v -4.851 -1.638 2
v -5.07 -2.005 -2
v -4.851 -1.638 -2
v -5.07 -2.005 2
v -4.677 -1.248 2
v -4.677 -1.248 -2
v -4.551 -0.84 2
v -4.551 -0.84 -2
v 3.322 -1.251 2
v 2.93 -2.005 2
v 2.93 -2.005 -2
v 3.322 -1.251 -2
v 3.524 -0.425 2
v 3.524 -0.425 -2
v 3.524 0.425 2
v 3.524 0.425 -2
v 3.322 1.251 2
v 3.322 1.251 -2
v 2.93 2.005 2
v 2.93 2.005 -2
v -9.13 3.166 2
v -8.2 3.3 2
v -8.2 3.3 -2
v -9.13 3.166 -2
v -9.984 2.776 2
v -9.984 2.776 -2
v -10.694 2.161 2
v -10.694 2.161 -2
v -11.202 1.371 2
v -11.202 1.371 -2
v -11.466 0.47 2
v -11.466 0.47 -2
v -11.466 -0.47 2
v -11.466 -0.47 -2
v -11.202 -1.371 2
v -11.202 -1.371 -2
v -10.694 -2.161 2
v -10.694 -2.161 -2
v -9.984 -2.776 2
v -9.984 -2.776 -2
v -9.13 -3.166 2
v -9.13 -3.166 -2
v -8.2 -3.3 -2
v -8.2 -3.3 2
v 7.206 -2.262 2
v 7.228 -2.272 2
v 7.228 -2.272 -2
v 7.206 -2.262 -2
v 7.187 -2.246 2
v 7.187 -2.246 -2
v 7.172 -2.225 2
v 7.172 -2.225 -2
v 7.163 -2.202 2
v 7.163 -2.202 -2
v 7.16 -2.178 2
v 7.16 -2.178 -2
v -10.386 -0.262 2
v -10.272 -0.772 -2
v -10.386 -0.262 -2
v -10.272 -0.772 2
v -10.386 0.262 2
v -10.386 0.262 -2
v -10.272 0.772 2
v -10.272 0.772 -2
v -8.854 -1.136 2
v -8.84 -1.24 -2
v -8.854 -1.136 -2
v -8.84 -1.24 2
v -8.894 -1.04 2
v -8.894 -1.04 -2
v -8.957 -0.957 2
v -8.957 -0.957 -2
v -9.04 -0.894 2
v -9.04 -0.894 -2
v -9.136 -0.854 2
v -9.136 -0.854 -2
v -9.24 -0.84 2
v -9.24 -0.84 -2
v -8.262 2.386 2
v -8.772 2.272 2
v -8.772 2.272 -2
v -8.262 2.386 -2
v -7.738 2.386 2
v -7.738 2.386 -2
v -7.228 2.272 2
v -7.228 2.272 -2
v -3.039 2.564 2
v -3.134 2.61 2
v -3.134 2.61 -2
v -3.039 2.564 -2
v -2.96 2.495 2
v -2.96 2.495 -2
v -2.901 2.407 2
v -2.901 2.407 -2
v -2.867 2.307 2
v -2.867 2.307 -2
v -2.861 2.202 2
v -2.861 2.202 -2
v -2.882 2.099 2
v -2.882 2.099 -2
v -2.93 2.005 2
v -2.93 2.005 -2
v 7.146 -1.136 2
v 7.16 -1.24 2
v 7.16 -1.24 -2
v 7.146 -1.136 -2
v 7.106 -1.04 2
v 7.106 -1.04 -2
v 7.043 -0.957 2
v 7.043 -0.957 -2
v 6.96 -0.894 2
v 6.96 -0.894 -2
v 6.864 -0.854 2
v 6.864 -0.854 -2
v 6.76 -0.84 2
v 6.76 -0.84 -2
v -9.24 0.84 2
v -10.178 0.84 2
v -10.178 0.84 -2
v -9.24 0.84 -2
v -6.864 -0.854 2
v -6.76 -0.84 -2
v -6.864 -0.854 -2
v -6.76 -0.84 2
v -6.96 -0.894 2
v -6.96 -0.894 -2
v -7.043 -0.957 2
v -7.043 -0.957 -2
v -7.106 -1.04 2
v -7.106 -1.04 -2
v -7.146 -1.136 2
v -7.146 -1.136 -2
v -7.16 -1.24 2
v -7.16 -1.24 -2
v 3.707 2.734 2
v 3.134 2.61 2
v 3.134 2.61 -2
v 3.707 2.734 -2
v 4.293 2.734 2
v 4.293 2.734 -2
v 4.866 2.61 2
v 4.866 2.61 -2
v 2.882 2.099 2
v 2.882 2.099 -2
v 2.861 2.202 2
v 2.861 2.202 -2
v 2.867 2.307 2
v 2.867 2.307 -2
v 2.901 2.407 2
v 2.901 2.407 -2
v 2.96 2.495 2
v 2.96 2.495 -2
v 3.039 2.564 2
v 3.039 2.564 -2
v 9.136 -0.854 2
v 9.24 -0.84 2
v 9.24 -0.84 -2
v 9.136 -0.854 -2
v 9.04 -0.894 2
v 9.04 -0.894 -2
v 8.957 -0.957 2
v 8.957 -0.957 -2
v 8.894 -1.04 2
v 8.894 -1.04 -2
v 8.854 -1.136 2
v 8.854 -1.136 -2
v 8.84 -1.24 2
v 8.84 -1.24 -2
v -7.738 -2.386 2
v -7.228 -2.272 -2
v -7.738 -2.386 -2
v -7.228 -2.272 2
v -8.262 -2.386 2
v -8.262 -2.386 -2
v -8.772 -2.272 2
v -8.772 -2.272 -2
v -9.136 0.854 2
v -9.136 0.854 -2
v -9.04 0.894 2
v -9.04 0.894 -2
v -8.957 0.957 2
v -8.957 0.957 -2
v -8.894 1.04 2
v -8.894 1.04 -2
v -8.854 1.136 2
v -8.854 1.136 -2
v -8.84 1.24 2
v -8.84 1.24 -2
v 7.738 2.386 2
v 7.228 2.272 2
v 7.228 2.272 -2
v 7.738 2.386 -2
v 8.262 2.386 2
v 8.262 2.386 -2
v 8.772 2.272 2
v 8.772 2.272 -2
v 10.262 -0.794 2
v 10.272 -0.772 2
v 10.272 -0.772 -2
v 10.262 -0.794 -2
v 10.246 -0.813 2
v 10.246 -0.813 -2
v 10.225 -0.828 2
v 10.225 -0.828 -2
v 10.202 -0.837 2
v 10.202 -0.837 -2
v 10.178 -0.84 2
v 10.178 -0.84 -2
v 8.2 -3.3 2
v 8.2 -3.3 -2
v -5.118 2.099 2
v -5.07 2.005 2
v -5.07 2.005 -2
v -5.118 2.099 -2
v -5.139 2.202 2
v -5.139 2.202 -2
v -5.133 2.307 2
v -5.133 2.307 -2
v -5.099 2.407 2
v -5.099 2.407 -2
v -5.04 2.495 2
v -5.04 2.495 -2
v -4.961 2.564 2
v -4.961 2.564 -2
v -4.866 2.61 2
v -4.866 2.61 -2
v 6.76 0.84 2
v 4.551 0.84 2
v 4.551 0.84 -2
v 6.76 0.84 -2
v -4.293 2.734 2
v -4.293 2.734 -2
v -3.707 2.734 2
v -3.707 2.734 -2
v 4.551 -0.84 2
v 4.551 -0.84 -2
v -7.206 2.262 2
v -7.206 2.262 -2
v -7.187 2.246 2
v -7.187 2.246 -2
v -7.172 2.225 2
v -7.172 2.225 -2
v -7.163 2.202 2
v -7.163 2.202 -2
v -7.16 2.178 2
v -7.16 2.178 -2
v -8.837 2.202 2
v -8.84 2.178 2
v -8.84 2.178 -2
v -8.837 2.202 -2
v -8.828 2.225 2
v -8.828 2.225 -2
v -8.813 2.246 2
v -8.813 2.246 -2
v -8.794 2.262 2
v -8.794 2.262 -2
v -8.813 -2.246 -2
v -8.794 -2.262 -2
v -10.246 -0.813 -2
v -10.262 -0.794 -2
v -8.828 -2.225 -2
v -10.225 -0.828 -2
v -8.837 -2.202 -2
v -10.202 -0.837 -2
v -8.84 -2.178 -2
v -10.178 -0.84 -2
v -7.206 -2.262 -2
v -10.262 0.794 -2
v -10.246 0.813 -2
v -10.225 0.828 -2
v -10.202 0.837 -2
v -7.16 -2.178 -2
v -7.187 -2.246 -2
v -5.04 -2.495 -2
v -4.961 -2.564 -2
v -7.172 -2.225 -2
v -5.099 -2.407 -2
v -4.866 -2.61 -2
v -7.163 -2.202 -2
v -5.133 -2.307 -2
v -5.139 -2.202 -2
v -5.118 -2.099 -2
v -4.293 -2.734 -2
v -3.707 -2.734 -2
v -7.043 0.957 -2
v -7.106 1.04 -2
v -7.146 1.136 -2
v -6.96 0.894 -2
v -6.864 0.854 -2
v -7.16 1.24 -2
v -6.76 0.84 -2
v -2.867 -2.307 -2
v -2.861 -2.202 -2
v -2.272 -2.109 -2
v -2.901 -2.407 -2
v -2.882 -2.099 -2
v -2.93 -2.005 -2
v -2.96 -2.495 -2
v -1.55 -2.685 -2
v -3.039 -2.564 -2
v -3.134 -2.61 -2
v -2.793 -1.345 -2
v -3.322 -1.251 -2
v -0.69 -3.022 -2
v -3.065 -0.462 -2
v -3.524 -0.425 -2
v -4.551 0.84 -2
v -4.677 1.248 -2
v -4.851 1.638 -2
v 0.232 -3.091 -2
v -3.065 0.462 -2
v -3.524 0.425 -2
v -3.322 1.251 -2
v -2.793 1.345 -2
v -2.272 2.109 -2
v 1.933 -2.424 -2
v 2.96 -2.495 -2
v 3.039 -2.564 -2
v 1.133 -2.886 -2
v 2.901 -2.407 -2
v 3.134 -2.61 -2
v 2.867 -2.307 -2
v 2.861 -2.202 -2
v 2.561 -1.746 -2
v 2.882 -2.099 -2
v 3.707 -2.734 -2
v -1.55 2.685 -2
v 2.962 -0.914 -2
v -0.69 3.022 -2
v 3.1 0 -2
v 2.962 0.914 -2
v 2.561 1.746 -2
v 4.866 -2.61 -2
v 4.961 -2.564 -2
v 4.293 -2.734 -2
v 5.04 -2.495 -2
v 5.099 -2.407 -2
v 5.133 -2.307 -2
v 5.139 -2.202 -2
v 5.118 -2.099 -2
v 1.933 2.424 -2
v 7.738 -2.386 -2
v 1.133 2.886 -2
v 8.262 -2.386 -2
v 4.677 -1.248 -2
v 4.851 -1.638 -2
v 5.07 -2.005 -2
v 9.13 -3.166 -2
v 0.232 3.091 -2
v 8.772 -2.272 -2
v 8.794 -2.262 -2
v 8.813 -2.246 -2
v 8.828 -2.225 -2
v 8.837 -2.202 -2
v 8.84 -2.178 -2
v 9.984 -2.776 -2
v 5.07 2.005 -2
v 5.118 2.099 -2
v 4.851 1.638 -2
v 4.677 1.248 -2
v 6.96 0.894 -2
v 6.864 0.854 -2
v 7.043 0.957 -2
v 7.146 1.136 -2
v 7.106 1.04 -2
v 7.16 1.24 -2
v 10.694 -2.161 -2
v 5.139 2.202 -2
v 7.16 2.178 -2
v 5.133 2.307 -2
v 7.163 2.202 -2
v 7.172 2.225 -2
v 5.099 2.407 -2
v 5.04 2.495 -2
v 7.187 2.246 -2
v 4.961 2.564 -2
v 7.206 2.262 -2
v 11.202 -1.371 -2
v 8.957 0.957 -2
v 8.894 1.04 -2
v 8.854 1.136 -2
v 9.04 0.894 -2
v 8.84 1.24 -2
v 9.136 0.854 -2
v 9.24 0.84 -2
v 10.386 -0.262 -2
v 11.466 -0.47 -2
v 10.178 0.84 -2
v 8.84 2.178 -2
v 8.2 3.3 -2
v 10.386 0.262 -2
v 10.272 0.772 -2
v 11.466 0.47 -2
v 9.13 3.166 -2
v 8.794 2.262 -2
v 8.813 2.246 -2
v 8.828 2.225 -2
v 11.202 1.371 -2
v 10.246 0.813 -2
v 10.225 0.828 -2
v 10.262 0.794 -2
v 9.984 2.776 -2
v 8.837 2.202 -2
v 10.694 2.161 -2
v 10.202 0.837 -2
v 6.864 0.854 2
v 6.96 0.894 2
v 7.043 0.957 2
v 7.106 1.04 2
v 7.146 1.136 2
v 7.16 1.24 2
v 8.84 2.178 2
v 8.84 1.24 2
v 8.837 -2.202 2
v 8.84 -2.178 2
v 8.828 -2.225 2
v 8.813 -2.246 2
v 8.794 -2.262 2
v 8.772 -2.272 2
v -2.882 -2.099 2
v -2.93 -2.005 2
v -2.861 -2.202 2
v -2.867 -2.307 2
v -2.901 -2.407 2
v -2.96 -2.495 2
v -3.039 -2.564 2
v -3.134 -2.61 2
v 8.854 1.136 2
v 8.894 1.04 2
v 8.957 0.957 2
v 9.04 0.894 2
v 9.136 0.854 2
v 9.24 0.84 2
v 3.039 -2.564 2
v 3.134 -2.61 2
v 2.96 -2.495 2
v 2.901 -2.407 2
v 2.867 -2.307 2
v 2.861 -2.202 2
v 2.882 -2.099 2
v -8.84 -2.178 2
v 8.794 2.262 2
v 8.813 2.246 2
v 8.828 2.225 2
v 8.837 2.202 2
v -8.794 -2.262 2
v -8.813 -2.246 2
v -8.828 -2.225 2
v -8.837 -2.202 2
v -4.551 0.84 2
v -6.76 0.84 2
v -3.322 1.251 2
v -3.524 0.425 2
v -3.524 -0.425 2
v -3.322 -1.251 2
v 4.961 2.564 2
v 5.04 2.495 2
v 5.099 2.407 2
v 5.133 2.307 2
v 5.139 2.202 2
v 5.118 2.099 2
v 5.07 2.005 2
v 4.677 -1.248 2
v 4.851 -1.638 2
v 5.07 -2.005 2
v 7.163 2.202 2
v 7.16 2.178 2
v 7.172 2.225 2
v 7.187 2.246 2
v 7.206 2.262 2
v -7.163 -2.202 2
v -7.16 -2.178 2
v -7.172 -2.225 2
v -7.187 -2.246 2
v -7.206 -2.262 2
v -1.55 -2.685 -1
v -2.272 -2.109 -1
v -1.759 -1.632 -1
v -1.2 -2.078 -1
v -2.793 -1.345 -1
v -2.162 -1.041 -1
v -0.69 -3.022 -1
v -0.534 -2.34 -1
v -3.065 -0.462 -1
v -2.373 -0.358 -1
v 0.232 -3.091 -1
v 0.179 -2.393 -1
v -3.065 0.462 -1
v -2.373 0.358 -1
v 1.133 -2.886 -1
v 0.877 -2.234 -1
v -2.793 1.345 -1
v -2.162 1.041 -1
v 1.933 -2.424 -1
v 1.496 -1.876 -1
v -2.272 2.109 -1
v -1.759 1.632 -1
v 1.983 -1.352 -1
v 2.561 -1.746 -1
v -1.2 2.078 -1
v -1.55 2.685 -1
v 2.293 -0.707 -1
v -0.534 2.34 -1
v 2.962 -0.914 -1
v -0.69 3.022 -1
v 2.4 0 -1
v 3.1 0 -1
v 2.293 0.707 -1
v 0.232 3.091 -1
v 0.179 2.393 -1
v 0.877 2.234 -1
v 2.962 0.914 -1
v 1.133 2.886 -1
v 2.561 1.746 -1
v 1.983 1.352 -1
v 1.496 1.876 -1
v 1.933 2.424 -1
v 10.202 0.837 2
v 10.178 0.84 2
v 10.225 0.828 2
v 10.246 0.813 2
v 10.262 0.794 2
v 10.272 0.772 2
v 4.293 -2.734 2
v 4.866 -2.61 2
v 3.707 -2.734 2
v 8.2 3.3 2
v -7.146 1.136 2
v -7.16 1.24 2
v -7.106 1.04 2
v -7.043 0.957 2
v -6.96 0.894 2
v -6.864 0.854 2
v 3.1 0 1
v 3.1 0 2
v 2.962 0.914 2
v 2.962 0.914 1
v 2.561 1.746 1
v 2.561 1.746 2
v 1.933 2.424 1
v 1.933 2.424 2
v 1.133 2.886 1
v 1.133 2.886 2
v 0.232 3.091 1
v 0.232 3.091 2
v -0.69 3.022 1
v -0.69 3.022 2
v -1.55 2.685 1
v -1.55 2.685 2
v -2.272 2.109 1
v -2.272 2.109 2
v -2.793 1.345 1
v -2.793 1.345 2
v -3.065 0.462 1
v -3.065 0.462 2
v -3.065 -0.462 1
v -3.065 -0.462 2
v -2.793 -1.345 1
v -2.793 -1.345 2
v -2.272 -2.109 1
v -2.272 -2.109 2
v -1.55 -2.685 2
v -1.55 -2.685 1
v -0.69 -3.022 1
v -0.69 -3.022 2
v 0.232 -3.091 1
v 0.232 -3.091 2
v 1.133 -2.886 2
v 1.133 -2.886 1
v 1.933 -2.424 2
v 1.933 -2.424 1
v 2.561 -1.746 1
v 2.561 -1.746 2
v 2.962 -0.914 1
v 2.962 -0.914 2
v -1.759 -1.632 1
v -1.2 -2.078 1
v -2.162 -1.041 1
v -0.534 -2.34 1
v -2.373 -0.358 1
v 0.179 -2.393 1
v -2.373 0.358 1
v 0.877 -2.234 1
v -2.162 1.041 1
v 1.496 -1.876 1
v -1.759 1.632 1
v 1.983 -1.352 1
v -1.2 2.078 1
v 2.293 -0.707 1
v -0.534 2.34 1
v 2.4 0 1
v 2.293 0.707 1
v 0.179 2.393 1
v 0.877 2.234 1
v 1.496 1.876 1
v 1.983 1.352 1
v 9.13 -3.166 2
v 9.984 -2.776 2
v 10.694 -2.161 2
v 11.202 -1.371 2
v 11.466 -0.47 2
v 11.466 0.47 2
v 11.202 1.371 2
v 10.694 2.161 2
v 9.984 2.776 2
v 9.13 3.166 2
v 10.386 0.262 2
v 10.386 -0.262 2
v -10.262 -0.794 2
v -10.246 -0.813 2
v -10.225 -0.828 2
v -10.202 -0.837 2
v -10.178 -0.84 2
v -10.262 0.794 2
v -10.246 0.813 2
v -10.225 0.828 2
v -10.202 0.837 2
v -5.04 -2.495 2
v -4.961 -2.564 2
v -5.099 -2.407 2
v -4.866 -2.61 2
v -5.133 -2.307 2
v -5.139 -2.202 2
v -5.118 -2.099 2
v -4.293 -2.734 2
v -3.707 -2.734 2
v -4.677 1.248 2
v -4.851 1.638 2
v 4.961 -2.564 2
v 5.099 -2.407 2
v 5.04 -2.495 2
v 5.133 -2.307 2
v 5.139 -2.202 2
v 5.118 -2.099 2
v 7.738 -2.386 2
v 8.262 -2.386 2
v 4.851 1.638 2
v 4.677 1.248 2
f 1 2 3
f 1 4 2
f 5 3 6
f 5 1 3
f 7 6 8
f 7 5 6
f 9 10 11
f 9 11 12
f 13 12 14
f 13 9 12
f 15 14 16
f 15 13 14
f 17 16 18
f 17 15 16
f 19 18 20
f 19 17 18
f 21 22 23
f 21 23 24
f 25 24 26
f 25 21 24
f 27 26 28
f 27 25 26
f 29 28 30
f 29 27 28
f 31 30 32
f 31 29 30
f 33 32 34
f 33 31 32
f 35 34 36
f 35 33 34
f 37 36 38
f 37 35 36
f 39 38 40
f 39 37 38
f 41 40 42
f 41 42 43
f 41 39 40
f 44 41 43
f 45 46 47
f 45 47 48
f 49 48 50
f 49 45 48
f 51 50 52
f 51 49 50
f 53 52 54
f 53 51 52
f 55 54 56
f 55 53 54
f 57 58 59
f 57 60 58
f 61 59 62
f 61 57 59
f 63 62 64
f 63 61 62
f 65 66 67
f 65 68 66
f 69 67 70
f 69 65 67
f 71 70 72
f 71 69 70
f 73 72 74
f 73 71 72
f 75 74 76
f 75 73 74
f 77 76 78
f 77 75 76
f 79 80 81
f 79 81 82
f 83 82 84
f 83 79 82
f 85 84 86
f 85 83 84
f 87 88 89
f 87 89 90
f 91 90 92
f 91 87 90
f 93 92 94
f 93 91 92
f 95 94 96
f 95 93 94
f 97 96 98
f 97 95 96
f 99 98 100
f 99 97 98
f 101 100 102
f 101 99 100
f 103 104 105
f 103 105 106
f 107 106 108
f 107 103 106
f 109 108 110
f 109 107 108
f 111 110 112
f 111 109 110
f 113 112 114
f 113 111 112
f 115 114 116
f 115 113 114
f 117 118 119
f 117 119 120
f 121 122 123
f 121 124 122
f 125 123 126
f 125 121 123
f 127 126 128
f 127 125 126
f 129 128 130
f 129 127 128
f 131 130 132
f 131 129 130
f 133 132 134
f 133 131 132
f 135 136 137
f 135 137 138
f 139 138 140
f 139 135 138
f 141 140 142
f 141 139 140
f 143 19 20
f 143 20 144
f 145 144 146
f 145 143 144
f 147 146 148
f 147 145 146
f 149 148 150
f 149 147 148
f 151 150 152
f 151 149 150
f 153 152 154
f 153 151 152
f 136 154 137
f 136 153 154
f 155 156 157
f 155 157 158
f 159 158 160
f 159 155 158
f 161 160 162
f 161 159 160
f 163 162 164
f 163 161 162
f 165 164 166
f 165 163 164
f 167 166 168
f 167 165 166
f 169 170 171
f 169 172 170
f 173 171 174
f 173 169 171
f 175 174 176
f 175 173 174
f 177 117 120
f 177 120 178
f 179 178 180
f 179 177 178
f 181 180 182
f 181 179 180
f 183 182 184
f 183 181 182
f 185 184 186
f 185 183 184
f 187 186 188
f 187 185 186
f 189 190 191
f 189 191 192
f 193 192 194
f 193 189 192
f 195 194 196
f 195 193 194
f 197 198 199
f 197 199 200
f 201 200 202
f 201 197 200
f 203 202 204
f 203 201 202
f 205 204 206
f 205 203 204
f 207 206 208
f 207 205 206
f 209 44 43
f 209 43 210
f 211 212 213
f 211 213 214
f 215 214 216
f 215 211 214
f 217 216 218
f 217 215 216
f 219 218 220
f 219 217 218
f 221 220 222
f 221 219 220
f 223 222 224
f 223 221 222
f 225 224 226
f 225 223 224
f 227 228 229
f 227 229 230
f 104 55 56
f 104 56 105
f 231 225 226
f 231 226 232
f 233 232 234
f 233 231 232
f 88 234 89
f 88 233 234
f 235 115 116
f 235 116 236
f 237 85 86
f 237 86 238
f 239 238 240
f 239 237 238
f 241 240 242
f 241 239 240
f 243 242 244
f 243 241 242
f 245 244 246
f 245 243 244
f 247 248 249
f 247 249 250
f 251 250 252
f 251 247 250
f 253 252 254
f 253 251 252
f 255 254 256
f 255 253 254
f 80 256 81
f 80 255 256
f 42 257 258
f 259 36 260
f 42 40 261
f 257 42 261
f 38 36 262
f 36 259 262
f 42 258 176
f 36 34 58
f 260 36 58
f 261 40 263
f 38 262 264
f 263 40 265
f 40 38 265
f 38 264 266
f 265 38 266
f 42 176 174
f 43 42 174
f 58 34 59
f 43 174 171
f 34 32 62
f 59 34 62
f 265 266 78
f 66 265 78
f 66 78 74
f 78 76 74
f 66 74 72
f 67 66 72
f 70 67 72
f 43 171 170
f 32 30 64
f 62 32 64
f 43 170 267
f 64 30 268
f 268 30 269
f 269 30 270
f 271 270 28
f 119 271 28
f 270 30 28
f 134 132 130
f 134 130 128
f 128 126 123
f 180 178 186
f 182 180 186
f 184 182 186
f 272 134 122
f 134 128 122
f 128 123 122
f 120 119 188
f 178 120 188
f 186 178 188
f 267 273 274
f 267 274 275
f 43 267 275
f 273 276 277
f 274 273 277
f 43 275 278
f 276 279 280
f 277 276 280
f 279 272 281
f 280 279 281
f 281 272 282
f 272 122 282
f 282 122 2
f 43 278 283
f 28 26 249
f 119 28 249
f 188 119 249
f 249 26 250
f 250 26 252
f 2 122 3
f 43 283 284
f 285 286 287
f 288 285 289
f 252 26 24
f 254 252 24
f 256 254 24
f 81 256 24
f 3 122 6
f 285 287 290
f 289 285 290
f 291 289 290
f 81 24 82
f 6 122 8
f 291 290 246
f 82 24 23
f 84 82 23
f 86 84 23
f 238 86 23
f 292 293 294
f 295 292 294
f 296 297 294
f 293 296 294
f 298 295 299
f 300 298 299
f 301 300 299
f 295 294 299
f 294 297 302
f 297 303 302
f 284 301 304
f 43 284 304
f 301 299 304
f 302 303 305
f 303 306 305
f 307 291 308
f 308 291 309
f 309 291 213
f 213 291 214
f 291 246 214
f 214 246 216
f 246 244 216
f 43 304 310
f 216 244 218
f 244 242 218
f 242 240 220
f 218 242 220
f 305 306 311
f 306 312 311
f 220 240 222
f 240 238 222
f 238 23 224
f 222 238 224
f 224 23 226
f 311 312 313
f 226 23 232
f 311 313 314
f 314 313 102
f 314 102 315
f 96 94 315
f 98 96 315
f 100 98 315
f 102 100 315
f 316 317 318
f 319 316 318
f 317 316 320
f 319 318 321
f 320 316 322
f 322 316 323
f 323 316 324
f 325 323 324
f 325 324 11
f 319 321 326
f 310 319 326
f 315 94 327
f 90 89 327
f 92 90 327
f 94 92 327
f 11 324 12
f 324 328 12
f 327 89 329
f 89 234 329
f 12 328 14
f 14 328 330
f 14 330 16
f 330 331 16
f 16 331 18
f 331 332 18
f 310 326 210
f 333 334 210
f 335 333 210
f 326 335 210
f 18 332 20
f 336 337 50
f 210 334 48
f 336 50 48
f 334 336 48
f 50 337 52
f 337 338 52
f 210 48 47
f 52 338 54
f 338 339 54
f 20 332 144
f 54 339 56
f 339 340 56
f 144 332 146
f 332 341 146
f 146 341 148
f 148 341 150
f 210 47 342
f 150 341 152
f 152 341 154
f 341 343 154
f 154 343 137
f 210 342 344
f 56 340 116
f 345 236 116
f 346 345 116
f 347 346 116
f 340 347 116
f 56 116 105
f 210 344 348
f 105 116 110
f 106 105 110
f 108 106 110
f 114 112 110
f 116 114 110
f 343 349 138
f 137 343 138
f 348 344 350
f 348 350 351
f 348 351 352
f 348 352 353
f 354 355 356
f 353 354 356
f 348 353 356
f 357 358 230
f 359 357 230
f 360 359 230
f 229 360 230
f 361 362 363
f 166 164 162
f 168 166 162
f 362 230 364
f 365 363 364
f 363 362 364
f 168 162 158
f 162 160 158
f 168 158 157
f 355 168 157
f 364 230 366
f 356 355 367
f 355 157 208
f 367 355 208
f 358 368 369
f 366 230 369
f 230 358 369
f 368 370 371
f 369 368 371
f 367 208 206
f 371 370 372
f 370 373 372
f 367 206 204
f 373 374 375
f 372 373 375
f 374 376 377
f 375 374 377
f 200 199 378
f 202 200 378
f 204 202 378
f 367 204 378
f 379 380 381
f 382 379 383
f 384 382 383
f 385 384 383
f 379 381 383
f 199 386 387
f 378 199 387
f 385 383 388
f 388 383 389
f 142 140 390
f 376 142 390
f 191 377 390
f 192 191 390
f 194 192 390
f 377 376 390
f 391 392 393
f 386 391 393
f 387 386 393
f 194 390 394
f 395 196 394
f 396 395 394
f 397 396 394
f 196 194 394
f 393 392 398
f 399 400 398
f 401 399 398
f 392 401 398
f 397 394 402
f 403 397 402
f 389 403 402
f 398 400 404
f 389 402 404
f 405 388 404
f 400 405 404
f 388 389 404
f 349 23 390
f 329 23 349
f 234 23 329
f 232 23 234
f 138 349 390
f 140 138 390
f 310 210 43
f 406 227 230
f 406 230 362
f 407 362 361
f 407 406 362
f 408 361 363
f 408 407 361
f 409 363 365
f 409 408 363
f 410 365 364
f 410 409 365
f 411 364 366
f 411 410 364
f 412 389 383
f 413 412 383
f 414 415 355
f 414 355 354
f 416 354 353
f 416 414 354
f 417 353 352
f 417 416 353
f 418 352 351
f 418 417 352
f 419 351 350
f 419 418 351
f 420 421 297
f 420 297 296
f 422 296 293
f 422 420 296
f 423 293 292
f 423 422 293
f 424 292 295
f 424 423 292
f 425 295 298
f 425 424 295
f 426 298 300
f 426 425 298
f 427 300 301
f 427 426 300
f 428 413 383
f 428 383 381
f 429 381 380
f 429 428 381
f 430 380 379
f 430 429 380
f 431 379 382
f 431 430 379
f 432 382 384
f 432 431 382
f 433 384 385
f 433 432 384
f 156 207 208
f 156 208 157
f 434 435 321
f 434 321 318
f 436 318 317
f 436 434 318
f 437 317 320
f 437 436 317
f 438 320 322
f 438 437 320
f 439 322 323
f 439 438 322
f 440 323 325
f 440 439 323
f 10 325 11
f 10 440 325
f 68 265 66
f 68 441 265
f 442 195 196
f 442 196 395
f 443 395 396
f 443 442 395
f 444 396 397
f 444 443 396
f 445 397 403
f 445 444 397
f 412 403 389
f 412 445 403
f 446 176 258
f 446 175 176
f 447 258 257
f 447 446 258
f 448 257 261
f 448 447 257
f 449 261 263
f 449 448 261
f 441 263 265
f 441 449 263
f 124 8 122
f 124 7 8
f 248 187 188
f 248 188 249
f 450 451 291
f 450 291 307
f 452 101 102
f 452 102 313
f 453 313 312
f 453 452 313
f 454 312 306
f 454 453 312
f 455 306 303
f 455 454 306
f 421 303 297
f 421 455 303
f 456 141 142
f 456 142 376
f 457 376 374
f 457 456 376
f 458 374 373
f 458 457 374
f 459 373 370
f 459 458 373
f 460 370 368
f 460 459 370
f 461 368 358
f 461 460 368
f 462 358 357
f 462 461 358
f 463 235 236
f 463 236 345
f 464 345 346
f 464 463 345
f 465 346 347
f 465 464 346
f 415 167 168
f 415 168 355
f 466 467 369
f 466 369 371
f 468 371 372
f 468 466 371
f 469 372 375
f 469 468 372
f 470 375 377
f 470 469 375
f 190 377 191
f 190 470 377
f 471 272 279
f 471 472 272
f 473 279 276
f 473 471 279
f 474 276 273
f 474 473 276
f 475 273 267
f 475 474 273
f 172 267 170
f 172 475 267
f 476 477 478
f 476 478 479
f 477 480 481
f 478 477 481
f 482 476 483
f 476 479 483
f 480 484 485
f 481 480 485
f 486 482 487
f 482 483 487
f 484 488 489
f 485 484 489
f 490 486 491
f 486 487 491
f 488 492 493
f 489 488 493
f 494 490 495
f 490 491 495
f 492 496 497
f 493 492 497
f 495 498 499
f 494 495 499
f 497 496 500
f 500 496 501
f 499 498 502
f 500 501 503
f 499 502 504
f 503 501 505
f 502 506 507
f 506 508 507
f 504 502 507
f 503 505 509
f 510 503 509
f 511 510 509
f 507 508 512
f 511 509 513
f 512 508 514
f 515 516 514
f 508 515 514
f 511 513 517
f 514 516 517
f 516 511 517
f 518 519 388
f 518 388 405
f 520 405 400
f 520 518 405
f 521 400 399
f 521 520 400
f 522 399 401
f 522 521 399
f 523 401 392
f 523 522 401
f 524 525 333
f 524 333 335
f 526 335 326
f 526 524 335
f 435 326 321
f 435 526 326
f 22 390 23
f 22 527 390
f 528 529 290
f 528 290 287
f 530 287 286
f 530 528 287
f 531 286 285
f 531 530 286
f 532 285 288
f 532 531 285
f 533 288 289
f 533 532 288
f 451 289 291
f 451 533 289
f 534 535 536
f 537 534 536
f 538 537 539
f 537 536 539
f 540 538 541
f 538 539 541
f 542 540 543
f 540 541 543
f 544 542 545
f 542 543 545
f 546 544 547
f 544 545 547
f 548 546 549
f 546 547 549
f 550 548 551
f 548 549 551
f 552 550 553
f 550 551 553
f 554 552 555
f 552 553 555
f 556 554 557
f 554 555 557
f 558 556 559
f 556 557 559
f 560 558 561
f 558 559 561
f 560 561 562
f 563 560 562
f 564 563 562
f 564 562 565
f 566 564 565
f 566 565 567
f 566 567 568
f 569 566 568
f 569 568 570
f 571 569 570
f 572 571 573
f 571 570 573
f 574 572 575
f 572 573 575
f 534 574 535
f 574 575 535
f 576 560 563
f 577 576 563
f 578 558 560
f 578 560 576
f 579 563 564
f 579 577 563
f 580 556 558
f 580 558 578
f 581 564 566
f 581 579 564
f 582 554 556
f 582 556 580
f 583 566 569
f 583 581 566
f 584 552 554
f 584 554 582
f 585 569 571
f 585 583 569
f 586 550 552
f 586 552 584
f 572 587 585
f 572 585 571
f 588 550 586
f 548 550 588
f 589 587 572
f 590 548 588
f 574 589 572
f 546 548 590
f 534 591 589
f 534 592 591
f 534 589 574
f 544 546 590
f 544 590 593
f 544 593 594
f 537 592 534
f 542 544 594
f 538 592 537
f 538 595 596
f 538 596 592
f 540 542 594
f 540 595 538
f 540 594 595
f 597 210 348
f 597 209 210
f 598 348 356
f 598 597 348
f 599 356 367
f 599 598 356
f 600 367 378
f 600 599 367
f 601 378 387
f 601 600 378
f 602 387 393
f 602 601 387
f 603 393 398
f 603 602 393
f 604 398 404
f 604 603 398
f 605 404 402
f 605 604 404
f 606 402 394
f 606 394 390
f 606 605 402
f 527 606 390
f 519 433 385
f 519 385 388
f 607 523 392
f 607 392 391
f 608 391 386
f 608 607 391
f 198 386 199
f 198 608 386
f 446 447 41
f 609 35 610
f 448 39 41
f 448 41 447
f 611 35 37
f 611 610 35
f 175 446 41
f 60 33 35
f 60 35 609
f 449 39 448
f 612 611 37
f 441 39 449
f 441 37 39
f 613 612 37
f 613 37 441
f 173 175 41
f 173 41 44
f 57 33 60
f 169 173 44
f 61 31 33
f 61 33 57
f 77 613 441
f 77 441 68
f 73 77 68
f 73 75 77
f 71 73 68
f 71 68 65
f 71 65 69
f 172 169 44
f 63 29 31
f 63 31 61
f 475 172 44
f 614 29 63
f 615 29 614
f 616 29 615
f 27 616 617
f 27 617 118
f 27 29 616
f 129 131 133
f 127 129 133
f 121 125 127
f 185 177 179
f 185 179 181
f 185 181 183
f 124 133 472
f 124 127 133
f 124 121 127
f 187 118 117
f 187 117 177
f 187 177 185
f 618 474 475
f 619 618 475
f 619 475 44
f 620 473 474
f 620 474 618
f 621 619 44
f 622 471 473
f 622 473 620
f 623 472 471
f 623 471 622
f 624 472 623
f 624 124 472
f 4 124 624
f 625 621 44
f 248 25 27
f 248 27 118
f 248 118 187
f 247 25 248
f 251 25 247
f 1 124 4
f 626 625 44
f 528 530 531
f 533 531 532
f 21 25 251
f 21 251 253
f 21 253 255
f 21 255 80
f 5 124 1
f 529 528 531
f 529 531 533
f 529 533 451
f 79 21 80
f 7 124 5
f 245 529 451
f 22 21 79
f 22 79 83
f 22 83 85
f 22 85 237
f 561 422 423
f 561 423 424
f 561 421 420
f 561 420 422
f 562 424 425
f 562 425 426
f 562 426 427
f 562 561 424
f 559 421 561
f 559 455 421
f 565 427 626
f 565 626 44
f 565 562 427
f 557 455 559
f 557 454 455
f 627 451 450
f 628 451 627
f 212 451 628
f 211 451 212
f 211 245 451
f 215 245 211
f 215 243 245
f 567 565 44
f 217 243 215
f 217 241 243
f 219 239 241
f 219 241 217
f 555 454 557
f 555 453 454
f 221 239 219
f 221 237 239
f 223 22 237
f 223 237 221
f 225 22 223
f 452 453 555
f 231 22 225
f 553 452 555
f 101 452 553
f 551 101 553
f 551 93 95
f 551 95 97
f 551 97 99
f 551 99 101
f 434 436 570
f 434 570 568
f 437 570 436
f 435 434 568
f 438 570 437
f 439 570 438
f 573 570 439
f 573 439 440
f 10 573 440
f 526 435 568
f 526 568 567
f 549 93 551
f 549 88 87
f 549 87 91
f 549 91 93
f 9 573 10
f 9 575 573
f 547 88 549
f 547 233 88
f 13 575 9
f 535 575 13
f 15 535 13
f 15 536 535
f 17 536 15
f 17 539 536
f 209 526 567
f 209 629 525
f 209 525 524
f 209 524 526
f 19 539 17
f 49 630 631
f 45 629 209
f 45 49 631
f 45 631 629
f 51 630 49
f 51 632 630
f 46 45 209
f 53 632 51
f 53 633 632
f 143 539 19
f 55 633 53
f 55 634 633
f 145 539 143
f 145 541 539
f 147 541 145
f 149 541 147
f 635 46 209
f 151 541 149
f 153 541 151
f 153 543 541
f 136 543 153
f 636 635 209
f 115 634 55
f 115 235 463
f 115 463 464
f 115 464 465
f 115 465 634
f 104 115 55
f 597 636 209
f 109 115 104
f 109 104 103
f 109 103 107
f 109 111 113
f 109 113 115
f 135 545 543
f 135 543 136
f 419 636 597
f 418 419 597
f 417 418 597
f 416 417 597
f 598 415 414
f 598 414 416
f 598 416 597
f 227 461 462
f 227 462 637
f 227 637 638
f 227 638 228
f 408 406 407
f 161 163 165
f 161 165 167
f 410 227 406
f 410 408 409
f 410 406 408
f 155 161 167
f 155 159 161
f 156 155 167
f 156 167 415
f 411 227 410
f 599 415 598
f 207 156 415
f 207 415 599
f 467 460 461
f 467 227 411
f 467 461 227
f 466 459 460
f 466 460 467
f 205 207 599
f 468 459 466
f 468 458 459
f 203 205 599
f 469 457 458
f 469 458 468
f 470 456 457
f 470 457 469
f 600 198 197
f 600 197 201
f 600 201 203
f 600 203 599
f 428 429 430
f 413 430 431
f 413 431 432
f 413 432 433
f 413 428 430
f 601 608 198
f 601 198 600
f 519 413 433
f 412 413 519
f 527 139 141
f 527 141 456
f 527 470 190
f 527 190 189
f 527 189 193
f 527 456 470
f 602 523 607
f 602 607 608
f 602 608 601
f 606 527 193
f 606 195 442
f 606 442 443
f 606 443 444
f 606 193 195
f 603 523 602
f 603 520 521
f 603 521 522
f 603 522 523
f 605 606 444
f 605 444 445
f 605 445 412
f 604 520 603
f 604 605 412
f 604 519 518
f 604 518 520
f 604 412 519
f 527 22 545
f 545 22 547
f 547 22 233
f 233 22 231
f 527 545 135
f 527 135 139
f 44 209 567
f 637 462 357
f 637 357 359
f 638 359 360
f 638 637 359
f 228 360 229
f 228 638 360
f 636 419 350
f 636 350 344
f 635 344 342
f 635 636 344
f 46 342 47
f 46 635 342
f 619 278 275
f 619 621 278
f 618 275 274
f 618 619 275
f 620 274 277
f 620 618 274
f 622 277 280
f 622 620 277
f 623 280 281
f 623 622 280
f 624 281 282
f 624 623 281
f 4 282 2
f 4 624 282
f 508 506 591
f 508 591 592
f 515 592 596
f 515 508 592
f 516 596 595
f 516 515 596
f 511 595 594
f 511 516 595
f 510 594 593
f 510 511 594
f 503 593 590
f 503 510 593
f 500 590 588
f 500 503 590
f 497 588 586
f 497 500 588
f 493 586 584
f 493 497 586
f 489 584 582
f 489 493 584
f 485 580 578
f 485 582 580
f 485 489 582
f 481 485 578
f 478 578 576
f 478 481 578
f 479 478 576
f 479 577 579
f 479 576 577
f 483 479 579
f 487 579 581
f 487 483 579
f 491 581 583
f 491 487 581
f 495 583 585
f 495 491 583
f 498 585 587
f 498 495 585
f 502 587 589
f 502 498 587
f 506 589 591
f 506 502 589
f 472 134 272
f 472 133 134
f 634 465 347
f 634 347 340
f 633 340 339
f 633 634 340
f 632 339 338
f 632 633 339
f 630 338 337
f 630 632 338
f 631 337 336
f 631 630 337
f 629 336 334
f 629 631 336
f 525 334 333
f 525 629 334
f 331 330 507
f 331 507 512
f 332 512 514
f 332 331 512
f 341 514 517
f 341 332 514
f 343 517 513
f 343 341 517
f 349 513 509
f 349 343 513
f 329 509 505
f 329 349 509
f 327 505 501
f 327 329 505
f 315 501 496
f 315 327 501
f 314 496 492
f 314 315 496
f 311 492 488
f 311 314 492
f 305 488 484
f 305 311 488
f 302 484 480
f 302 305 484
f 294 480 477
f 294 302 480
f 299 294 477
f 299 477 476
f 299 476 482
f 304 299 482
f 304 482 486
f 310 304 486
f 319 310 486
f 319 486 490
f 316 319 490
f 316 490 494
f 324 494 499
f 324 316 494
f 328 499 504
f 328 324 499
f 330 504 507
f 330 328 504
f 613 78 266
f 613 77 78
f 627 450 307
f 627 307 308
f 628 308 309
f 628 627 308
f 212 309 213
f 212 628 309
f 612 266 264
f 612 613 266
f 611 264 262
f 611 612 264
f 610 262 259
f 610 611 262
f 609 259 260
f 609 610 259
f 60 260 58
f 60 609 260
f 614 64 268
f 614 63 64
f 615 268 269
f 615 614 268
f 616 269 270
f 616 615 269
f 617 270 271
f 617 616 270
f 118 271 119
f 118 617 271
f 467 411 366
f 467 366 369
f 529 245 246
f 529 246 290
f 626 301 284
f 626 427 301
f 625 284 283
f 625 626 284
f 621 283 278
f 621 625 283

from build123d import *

# Parameters (mm, degrees)
SKETCH2_R           = 2.4
BOSS_EXTRUDE1_DEPTH = 2
SKETCH4_R           = 3.1
CUT_EXTRUDE1_DEPTH  = 1


with BuildPart() as part:
    # Sketch2 → Boss-Extrude1 (new, symmetric)
    with BuildSketch(Plane.XY):
        with BuildLine():
            Line((8.2, 3.3), (-8.2, 3.3))
            ThreePointArc((-8.2, 3.3), (-11.5, 0), (-8.2, -3.3))
            Line((-8.2, -3.3), (8.2, -3.3))
            ThreePointArc((8.2, -3.3), (11.5, 0), (8.2, 3.3))
        make_face()
        with BuildLine():
            Line((-10.177705214, 0.84), (-9.24, 0.84))
            ThreePointArc((-9.24, 0.84), (-8.957157288, 0.957157288), (-8.84, 1.24))
            Line((-8.84, 1.24), (-8.84, 2.177705214))
            ThreePointArc((-8.84, 2.177705214), (-8.821293884, 2.235940121), (-8.772173913, 2.27238805))
            ThreePointArc((-8.772173913, 2.27238805), (-8, 2.4), (-7.227826087, 2.27238805))
            ThreePointArc((-7.227826087, 2.27238805), (-7.178706116, 2.235940121), (-7.16, 2.177705214))
            Line((-7.16, 2.177705214), (-7.16, 1.24))
            ThreePointArc((-7.16, 1.24), (-7.042842712, 0.957157288), (-6.76, 0.84))
            Line((-6.76, 0.84), (-5.822294786, 0.84))
            Line((-5.822294786, 0.84), (-5.751800721, 0.84))
            Line((-5.751800721, 0.84), (-4.55081169, 0.84))
            ThreePointArc((-4.55081169, 0.84), (-4.757752494, 1.445797742), (-5.070126582, 2.004580194))
            ThreePointArc((-5.070126582, 2.004580194), (-5.119033599, 2.358251088), (-4.865957447, 2.610099174))
            ThreePointArc((-4.865957447, 2.610099174), (-4, 2.75), (-3.134042553, 2.610099174))
            ThreePointArc((-3.134042553, 2.610099174), (-2.880966401, 2.358251088), (-2.929873418, 2.004580194))
            ThreePointArc((-2.929873418, 2.004580194), (-3.55, 0), (-2.929873418, -2.004580194))
            ThreePointArc((-2.929873418, -2.004580194), (-2.880966401, -2.358251088), (-3.134042553, -2.610099174))
            ThreePointArc((-3.134042553, -2.610099174), (-4, -2.75), (-4.865957447, -2.610099174))
            ThreePointArc((-4.865957447, -2.610099174), (-5.119033599, -2.358251088), (-5.070126582, -2.004580194))
            ThreePointArc((-5.070126582, -2.004580194), (-4.757752494, -1.445797742), (-4.55081169, -0.84))
            Line((-4.55081169, -0.84), (-5.751800721, -0.84))
            Line((-5.751800721, -0.84), (-5.822294786, -0.84))
            Line((-5.822294786, -0.84), (-6.76, -0.84))
            ThreePointArc((-6.76, -0.84), (-7.042842712, -0.957157288), (-7.16, -1.24))
            Line((-7.16, -1.24), (-7.16, -2.177705214))
            ThreePointArc((-7.16, -2.177705214), (-7.178706116, -2.235940121), (-7.227826087, -2.27238805))
            ThreePointArc((-7.227826087, -2.27238805), (-8, -2.4), (-8.772173913, -2.27238805))
            ThreePointArc((-8.772173913, -2.27238805), (-8.821293884, -2.235940121), (-8.84, -2.177705214))
            Line((-8.84, -2.177705214), (-8.84, -1.24))
            ThreePointArc((-8.84, -1.24), (-8.957157288, -0.957157288), (-9.24, -0.84))
            Line((-9.24, -0.84), (-10.177705214, -0.84))
            ThreePointArc((-10.177705214, -0.84), (-10.235940121, -0.821293884), (-10.27238805, -0.772173913))
            ThreePointArc((-10.27238805, -0.772173913), (-10.4, 0), (-10.27238805, 0.772173913))
            ThreePointArc((-10.27238805, 0.772173913), (-10.235940121, 0.821293884), (-10.177705214, 0.84))
        make_face(mode=Mode.SUBTRACT)
        Circle(SKETCH2_R, mode=Mode.SUBTRACT)
        with BuildLine():
            Line((8.84, 2.177705214), (8.84, 1.24))
            ThreePointArc((8.84, 1.24), (8.957157288, 0.957157288), (9.24, 0.84))
            Line((9.24, 0.84), (10.177705214, 0.84))
            ThreePointArc((10.177705214, 0.84), (10.235940121, 0.821293884), (10.27238805, 0.772173913))
            ThreePointArc((10.27238805, 0.772173913), (10.4, 0), (10.27238805, -0.772173913))
            ThreePointArc((10.27238805, -0.772173913), (10.235940121, -0.821293884), (10.177705214, -0.84))
            Line((10.177705214, -0.84), (9.24, -0.84))
            ThreePointArc((9.24, -0.84), (8.957157288, -0.957157288), (8.84, -1.24))
            Line((8.84, -1.24), (8.84, -2.177705214))
            ThreePointArc((8.84, -2.177705214), (8.821293884, -2.235940121), (8.772173913, -2.27238805))
            ThreePointArc((8.772173913, -2.27238805), (8, -2.4), (7.227826087, -2.27238805))
            ThreePointArc((7.227826087, -2.27238805), (7.178706116, -2.235940121), (7.16, -2.177705214))
            Line((7.16, -2.177705214), (7.16, -1.24))
            ThreePointArc((7.16, -1.24), (7.042842712, -0.957157288), (6.76, -0.84))
            Line((6.76, -0.84), (5.822294786, -0.84))
            Line((5.822294786, -0.84), (5.751800721, -0.84))
            Line((5.751800721, -0.84), (4.55081169, -0.84))
            ThreePointArc((4.55081169, -0.84), (4.757752494, -1.445797742), (5.070126582, -2.004580194))
            ThreePointArc((5.070126582, -2.004580194), (5.119033599, -2.358251088), (4.865957447, -2.610099174))
            ThreePointArc((4.865957447, -2.610099174), (4, -2.75), (3.134042553, -2.610099174))
            ThreePointArc((3.134042553, -2.610099174), (2.880966401, -2.358251088), (2.929873418, -2.004580194))
            ThreePointArc((2.929873418, -2.004580194), (3.55, 0), (2.929873418, 2.004580194))
            ThreePointArc((2.929873418, 2.004580194), (2.880966401, 2.358251088), (3.134042553, 2.610099174))
            ThreePointArc((3.134042553, 2.610099174), (4, 2.75), (4.865957447, 2.610099174))
            ThreePointArc((4.865957447, 2.610099174), (5.119033599, 2.358251088), (5.070126582, 2.004580194))
            ThreePointArc((5.070126582, 2.004580194), (4.757752494, 1.445797742), (4.55081169, 0.84))
            Line((4.55081169, 0.84), (5.751800721, 0.84))
            Line((5.751800721, 0.84), (5.822294786, 0.84))
            Line((5.822294786, 0.84), (6.76, 0.84))
            ThreePointArc((6.76, 0.84), (7.042842712, 0.957157288), (7.16, 1.24))
            Line((7.16, 1.24), (7.16, 2.177705214))
            ThreePointArc((7.16, 2.177705214), (7.178706116, 2.235940121), (7.227826087, 2.27238805))
            ThreePointArc((7.227826087, 2.27238805), (8, 2.4), (8.772173913, 2.27238805))
            ThreePointArc((8.772173913, 2.27238805), (8.821293884, 2.235940121), (8.84, 2.177705214))
        make_face(mode=Mode.SUBTRACT)
    extrude(amount=BOSS_EXTRUDE1_DEPTH, both=True)

    # Sketch4 → Cut-Extrude1 (cut)
    with BuildSketch(Plane.XY.offset(2)):
        Circle(SKETCH4_R)
    cut_extrude1 = extrude(amount=-CUT_EXTRUDE1_DEPTH, mode=Mode.SUBTRACT)

    # Mirror1: Cut-Extrude1 across plane
    add(cut_extrude1.mirror(Plane.XY), mode=Mode.SUBTRACT)


solid = part.part
